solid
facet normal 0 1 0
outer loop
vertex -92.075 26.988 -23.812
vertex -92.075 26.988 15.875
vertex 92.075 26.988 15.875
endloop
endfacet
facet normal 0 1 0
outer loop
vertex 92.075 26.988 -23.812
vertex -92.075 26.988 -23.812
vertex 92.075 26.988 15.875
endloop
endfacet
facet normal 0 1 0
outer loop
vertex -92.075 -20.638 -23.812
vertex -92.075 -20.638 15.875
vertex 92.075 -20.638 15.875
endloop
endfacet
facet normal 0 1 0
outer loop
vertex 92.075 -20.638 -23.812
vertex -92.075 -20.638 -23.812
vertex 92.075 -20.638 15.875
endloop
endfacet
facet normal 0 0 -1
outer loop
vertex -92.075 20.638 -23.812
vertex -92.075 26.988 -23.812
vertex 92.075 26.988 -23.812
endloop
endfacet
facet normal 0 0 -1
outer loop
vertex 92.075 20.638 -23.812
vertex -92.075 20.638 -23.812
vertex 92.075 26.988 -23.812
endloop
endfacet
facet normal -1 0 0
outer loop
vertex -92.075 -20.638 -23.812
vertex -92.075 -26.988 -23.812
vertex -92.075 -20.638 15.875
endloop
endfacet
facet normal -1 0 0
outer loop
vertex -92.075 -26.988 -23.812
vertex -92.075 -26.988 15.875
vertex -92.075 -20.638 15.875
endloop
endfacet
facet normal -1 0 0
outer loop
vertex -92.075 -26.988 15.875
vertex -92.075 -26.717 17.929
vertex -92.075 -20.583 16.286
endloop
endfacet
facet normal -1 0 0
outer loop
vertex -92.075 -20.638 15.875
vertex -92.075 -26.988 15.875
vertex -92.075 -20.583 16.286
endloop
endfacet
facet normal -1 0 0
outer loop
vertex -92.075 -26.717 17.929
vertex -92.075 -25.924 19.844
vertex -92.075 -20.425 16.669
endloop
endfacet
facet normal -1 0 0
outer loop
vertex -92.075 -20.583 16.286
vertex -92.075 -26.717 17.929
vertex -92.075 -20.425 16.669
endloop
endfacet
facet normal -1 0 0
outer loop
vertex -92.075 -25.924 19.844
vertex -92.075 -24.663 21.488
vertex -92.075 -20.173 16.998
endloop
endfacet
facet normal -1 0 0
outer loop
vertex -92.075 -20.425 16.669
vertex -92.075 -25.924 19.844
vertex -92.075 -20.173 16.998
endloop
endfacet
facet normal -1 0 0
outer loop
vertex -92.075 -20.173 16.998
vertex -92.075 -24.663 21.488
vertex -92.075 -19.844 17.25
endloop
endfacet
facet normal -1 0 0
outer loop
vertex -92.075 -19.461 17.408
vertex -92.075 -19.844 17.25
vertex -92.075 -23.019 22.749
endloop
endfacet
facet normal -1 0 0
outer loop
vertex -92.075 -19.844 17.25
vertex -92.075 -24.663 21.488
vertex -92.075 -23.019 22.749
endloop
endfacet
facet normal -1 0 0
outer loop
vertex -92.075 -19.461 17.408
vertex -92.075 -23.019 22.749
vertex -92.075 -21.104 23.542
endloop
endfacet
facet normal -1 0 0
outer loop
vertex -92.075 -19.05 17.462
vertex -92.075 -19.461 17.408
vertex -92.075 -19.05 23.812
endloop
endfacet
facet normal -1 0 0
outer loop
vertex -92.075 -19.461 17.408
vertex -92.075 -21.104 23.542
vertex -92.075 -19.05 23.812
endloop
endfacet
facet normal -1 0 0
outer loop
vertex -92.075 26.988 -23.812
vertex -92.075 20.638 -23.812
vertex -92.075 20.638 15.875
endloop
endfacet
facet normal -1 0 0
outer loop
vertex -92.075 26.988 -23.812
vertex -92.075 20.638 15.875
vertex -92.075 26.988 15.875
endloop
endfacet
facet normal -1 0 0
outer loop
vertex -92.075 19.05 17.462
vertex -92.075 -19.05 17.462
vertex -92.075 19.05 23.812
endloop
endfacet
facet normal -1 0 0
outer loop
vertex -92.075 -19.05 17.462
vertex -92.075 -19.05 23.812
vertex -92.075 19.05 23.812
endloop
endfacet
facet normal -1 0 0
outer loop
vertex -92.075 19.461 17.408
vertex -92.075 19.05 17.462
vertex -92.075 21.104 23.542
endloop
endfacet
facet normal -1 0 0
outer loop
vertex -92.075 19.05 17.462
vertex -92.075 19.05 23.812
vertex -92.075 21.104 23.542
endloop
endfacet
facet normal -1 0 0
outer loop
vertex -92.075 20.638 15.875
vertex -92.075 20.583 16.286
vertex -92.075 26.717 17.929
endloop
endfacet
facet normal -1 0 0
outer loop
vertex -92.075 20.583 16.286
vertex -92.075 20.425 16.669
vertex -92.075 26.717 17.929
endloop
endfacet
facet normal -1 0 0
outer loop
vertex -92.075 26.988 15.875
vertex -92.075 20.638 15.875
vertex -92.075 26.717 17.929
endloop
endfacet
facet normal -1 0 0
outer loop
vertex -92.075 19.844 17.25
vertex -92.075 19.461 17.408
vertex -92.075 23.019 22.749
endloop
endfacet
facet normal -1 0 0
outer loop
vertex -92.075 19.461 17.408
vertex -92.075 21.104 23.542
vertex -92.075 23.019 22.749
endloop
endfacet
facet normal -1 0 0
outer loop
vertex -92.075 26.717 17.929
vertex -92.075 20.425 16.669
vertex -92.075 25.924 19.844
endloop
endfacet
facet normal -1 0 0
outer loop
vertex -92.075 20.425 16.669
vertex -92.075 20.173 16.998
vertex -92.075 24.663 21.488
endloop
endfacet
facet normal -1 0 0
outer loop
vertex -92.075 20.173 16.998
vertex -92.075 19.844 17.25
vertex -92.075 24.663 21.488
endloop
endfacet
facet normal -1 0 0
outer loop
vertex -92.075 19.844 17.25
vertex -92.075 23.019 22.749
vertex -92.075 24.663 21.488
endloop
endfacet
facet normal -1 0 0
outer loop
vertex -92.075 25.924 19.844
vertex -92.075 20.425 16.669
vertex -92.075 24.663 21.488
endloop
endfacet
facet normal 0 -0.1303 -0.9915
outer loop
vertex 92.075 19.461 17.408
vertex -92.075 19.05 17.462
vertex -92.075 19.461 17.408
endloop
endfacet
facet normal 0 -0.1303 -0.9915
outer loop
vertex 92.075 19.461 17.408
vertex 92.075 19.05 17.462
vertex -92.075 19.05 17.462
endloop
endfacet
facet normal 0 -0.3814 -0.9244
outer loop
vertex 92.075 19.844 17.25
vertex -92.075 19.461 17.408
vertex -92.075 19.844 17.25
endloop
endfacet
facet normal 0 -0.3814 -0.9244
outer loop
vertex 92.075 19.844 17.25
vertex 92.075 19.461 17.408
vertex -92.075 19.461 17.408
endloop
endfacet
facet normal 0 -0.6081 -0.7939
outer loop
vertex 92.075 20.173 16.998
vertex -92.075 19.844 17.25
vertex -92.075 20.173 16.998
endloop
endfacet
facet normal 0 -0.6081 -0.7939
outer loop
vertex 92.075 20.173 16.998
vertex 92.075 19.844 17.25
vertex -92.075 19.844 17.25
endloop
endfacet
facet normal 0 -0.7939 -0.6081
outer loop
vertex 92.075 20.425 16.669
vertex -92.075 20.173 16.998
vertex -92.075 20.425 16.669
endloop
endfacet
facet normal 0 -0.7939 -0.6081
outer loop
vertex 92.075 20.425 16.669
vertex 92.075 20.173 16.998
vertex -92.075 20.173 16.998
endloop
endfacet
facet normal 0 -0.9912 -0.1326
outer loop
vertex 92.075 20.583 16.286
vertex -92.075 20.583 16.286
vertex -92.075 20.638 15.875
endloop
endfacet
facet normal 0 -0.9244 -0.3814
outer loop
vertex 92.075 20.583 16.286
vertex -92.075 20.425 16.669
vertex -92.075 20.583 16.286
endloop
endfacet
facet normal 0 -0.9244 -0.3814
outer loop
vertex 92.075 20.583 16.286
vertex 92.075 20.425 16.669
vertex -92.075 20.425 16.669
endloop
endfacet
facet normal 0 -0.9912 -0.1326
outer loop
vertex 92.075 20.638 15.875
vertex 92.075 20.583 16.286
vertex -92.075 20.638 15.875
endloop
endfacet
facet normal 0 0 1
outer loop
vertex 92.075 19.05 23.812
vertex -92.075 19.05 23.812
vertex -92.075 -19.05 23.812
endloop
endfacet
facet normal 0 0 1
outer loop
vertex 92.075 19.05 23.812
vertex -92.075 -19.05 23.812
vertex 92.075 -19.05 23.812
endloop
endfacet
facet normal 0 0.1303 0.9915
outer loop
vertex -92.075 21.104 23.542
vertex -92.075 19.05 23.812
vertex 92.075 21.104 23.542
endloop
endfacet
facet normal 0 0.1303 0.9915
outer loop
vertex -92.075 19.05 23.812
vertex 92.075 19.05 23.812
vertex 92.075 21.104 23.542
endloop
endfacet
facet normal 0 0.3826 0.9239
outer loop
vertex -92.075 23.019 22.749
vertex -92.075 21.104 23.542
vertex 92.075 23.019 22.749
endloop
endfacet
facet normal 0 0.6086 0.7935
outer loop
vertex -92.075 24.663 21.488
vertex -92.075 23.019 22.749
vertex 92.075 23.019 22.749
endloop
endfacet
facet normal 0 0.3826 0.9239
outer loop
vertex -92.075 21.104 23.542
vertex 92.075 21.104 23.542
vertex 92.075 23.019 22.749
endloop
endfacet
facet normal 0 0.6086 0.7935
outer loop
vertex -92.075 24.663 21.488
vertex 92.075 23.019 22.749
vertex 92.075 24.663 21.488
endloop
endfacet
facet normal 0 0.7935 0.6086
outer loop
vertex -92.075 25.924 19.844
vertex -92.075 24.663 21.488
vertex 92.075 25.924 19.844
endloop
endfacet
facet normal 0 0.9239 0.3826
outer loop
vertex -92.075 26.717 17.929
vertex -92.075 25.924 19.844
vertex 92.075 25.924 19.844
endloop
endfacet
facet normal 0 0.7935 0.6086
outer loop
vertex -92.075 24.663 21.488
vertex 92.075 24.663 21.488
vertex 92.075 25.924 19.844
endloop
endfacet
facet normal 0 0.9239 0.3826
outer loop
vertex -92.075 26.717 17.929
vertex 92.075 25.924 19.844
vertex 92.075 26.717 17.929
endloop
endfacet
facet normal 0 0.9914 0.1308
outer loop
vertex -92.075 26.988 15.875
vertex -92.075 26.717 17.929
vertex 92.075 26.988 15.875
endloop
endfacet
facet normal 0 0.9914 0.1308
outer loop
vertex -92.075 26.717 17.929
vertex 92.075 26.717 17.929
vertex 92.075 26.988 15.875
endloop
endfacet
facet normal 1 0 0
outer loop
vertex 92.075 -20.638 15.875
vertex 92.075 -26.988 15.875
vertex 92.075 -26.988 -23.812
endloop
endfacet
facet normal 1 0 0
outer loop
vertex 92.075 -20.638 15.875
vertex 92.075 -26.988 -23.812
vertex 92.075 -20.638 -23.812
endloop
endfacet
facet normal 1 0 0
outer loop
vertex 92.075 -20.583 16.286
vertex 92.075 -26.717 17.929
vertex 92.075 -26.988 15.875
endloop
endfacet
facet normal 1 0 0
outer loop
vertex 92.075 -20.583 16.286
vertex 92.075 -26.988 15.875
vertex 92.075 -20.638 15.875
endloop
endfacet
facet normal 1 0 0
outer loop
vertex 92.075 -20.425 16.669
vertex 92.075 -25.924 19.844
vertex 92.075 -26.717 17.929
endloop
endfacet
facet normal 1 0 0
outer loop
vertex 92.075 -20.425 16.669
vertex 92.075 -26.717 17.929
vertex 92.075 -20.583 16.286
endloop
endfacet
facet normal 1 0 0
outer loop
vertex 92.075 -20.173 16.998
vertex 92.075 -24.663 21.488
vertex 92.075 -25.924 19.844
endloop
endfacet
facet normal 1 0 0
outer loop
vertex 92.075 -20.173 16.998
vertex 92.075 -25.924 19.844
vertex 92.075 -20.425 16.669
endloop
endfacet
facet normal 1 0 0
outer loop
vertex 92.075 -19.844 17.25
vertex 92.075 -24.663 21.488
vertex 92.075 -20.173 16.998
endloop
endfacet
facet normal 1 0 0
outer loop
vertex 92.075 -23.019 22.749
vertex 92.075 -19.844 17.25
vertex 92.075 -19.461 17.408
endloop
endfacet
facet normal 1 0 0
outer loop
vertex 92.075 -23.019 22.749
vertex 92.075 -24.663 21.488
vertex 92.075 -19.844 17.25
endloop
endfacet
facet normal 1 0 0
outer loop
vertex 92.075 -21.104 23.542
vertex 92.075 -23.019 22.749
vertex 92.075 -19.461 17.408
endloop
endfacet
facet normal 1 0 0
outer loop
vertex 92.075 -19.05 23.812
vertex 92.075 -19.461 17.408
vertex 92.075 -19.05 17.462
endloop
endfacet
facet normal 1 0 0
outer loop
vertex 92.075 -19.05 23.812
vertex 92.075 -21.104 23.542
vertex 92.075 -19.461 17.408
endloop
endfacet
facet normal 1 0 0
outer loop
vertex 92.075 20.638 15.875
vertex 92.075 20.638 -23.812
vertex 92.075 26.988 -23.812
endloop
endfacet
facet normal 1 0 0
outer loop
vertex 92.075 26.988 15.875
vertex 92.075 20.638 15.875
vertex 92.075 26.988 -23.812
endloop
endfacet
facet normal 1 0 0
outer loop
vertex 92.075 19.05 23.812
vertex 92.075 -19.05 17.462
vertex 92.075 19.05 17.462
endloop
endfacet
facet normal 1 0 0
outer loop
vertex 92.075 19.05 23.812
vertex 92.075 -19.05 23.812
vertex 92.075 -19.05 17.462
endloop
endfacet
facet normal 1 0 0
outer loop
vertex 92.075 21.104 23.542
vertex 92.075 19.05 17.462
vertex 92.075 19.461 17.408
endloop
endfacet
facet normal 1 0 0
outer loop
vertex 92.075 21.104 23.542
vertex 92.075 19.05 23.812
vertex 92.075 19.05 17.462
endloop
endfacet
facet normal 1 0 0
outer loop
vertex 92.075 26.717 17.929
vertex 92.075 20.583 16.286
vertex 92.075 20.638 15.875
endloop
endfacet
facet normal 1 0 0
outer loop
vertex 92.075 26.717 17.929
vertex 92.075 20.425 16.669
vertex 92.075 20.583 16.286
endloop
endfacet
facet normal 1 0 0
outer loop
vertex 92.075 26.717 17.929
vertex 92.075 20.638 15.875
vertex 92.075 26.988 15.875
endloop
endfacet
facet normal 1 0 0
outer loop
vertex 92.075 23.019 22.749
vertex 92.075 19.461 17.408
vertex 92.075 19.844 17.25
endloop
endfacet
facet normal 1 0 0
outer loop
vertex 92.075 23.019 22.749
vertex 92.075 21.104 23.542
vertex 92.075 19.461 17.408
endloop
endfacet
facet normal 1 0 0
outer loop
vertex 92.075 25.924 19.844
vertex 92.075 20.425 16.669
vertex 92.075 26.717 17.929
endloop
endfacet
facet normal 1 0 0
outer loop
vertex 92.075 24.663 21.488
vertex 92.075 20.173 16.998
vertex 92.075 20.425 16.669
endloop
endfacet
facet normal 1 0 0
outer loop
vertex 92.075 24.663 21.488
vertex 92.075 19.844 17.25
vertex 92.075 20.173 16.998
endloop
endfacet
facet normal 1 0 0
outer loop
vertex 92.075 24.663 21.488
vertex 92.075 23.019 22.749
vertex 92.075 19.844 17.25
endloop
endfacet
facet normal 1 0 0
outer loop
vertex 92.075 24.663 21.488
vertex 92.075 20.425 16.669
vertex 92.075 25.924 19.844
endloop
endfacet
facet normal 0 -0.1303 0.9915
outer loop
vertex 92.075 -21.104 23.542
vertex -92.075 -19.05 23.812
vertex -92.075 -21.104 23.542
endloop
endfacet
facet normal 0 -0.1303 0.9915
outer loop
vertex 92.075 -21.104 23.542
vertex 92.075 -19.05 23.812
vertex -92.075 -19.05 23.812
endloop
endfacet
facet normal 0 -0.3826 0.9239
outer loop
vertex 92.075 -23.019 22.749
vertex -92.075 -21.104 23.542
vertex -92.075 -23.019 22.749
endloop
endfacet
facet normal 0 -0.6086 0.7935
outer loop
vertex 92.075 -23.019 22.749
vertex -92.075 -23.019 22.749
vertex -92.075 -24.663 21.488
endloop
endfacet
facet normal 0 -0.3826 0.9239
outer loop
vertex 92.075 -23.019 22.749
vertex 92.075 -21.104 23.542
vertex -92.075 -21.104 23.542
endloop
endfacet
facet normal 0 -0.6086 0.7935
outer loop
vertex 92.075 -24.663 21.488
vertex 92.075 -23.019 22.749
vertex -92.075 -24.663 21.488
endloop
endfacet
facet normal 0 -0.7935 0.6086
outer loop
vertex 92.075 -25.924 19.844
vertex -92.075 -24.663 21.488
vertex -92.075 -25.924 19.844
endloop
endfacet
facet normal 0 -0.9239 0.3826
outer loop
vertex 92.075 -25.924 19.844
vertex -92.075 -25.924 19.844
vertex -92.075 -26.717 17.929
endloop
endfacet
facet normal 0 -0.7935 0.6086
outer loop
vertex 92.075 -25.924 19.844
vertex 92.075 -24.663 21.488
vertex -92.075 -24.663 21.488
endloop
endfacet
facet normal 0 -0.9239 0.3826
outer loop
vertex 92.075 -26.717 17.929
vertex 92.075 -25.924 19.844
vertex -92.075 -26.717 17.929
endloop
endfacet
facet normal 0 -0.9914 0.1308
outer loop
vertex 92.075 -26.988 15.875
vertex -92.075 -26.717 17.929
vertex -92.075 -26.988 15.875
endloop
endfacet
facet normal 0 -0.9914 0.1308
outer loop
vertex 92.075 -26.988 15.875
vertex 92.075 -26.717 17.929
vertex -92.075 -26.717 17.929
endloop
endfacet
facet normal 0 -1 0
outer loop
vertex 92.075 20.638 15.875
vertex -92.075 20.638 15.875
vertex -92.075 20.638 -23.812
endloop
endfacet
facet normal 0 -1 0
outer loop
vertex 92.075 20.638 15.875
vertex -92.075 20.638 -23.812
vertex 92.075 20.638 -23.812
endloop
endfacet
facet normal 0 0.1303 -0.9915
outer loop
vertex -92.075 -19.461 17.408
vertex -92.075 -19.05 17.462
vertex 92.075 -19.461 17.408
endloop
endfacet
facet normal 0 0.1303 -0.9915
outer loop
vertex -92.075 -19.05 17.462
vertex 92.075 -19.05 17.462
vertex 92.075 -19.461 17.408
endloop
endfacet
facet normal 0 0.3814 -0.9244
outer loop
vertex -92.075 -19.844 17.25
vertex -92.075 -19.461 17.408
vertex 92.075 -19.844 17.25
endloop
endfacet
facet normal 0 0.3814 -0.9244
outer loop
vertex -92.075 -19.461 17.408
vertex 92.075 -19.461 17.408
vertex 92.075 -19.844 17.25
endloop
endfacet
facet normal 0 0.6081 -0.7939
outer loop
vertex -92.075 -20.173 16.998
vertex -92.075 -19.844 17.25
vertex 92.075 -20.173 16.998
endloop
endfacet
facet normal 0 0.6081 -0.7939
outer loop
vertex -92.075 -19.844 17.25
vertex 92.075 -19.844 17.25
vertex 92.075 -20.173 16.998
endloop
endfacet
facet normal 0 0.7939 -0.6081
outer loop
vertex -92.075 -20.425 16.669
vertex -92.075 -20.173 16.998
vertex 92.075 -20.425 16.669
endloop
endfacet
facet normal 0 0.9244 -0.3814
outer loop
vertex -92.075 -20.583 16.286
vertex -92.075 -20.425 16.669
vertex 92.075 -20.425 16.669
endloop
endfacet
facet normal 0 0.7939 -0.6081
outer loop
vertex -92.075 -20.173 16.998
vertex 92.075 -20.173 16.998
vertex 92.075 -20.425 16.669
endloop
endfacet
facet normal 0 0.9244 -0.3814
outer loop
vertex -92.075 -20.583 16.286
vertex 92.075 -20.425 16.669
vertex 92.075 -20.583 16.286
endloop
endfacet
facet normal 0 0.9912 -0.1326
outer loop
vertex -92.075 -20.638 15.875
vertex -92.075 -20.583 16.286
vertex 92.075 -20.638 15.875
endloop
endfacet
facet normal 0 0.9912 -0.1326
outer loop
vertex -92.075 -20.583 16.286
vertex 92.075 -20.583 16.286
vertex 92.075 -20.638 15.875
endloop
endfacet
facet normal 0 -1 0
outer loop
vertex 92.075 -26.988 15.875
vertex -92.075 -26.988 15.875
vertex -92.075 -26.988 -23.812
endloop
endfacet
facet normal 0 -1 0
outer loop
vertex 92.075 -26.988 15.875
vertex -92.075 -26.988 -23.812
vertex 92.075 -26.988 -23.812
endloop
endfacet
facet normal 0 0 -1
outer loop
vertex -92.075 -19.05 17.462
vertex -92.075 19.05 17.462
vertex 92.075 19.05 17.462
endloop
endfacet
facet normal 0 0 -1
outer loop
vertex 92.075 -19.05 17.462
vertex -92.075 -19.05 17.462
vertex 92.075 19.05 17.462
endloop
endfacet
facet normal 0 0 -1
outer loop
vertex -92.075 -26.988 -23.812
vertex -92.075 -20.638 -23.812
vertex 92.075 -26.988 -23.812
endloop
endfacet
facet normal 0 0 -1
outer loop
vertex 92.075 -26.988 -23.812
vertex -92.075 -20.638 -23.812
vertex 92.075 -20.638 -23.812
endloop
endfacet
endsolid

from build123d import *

# Parameters (mm, degrees)
SKETCH1_W           = 184.15
SKETCH1_H           = 53.975
BOSS_EXTRUDE1_DEPTH = 23.8125
FILLET1_R           = 7.9375
SHELL1_T            = -6.35


with BuildPart() as part:
    # Sketch1 → Boss-Extrude1 (new, symmetric)
    with BuildSketch(Plane.XY):
        Rectangle(SKETCH1_W, SKETCH1_H)
    extrude(amount=BOSS_EXTRUDE1_DEPTH, both=True)

    # Fillet1
    fillet1_edges = [part.edges().sort_by_distance(p)[0] for p in [
        (0, 26.9875, 23.8125),
        (0, -26.9875, 23.8125),
    ]]
    fillet(fillet1_edges, radius=FILLET1_R)

    # Shell1
    shell1_openings = [part.faces().sort_by_distance(p)[0] for p in [
        (0, 0, -23.8125),
        (92.075, 0, -0.234313972),
        (-92.075, 0, -0.234313972),
    ]]
    offset(amount=SHELL1_T, openings=shell1_openings, kind=Kind.INTERSECTION)


solid = part.part
